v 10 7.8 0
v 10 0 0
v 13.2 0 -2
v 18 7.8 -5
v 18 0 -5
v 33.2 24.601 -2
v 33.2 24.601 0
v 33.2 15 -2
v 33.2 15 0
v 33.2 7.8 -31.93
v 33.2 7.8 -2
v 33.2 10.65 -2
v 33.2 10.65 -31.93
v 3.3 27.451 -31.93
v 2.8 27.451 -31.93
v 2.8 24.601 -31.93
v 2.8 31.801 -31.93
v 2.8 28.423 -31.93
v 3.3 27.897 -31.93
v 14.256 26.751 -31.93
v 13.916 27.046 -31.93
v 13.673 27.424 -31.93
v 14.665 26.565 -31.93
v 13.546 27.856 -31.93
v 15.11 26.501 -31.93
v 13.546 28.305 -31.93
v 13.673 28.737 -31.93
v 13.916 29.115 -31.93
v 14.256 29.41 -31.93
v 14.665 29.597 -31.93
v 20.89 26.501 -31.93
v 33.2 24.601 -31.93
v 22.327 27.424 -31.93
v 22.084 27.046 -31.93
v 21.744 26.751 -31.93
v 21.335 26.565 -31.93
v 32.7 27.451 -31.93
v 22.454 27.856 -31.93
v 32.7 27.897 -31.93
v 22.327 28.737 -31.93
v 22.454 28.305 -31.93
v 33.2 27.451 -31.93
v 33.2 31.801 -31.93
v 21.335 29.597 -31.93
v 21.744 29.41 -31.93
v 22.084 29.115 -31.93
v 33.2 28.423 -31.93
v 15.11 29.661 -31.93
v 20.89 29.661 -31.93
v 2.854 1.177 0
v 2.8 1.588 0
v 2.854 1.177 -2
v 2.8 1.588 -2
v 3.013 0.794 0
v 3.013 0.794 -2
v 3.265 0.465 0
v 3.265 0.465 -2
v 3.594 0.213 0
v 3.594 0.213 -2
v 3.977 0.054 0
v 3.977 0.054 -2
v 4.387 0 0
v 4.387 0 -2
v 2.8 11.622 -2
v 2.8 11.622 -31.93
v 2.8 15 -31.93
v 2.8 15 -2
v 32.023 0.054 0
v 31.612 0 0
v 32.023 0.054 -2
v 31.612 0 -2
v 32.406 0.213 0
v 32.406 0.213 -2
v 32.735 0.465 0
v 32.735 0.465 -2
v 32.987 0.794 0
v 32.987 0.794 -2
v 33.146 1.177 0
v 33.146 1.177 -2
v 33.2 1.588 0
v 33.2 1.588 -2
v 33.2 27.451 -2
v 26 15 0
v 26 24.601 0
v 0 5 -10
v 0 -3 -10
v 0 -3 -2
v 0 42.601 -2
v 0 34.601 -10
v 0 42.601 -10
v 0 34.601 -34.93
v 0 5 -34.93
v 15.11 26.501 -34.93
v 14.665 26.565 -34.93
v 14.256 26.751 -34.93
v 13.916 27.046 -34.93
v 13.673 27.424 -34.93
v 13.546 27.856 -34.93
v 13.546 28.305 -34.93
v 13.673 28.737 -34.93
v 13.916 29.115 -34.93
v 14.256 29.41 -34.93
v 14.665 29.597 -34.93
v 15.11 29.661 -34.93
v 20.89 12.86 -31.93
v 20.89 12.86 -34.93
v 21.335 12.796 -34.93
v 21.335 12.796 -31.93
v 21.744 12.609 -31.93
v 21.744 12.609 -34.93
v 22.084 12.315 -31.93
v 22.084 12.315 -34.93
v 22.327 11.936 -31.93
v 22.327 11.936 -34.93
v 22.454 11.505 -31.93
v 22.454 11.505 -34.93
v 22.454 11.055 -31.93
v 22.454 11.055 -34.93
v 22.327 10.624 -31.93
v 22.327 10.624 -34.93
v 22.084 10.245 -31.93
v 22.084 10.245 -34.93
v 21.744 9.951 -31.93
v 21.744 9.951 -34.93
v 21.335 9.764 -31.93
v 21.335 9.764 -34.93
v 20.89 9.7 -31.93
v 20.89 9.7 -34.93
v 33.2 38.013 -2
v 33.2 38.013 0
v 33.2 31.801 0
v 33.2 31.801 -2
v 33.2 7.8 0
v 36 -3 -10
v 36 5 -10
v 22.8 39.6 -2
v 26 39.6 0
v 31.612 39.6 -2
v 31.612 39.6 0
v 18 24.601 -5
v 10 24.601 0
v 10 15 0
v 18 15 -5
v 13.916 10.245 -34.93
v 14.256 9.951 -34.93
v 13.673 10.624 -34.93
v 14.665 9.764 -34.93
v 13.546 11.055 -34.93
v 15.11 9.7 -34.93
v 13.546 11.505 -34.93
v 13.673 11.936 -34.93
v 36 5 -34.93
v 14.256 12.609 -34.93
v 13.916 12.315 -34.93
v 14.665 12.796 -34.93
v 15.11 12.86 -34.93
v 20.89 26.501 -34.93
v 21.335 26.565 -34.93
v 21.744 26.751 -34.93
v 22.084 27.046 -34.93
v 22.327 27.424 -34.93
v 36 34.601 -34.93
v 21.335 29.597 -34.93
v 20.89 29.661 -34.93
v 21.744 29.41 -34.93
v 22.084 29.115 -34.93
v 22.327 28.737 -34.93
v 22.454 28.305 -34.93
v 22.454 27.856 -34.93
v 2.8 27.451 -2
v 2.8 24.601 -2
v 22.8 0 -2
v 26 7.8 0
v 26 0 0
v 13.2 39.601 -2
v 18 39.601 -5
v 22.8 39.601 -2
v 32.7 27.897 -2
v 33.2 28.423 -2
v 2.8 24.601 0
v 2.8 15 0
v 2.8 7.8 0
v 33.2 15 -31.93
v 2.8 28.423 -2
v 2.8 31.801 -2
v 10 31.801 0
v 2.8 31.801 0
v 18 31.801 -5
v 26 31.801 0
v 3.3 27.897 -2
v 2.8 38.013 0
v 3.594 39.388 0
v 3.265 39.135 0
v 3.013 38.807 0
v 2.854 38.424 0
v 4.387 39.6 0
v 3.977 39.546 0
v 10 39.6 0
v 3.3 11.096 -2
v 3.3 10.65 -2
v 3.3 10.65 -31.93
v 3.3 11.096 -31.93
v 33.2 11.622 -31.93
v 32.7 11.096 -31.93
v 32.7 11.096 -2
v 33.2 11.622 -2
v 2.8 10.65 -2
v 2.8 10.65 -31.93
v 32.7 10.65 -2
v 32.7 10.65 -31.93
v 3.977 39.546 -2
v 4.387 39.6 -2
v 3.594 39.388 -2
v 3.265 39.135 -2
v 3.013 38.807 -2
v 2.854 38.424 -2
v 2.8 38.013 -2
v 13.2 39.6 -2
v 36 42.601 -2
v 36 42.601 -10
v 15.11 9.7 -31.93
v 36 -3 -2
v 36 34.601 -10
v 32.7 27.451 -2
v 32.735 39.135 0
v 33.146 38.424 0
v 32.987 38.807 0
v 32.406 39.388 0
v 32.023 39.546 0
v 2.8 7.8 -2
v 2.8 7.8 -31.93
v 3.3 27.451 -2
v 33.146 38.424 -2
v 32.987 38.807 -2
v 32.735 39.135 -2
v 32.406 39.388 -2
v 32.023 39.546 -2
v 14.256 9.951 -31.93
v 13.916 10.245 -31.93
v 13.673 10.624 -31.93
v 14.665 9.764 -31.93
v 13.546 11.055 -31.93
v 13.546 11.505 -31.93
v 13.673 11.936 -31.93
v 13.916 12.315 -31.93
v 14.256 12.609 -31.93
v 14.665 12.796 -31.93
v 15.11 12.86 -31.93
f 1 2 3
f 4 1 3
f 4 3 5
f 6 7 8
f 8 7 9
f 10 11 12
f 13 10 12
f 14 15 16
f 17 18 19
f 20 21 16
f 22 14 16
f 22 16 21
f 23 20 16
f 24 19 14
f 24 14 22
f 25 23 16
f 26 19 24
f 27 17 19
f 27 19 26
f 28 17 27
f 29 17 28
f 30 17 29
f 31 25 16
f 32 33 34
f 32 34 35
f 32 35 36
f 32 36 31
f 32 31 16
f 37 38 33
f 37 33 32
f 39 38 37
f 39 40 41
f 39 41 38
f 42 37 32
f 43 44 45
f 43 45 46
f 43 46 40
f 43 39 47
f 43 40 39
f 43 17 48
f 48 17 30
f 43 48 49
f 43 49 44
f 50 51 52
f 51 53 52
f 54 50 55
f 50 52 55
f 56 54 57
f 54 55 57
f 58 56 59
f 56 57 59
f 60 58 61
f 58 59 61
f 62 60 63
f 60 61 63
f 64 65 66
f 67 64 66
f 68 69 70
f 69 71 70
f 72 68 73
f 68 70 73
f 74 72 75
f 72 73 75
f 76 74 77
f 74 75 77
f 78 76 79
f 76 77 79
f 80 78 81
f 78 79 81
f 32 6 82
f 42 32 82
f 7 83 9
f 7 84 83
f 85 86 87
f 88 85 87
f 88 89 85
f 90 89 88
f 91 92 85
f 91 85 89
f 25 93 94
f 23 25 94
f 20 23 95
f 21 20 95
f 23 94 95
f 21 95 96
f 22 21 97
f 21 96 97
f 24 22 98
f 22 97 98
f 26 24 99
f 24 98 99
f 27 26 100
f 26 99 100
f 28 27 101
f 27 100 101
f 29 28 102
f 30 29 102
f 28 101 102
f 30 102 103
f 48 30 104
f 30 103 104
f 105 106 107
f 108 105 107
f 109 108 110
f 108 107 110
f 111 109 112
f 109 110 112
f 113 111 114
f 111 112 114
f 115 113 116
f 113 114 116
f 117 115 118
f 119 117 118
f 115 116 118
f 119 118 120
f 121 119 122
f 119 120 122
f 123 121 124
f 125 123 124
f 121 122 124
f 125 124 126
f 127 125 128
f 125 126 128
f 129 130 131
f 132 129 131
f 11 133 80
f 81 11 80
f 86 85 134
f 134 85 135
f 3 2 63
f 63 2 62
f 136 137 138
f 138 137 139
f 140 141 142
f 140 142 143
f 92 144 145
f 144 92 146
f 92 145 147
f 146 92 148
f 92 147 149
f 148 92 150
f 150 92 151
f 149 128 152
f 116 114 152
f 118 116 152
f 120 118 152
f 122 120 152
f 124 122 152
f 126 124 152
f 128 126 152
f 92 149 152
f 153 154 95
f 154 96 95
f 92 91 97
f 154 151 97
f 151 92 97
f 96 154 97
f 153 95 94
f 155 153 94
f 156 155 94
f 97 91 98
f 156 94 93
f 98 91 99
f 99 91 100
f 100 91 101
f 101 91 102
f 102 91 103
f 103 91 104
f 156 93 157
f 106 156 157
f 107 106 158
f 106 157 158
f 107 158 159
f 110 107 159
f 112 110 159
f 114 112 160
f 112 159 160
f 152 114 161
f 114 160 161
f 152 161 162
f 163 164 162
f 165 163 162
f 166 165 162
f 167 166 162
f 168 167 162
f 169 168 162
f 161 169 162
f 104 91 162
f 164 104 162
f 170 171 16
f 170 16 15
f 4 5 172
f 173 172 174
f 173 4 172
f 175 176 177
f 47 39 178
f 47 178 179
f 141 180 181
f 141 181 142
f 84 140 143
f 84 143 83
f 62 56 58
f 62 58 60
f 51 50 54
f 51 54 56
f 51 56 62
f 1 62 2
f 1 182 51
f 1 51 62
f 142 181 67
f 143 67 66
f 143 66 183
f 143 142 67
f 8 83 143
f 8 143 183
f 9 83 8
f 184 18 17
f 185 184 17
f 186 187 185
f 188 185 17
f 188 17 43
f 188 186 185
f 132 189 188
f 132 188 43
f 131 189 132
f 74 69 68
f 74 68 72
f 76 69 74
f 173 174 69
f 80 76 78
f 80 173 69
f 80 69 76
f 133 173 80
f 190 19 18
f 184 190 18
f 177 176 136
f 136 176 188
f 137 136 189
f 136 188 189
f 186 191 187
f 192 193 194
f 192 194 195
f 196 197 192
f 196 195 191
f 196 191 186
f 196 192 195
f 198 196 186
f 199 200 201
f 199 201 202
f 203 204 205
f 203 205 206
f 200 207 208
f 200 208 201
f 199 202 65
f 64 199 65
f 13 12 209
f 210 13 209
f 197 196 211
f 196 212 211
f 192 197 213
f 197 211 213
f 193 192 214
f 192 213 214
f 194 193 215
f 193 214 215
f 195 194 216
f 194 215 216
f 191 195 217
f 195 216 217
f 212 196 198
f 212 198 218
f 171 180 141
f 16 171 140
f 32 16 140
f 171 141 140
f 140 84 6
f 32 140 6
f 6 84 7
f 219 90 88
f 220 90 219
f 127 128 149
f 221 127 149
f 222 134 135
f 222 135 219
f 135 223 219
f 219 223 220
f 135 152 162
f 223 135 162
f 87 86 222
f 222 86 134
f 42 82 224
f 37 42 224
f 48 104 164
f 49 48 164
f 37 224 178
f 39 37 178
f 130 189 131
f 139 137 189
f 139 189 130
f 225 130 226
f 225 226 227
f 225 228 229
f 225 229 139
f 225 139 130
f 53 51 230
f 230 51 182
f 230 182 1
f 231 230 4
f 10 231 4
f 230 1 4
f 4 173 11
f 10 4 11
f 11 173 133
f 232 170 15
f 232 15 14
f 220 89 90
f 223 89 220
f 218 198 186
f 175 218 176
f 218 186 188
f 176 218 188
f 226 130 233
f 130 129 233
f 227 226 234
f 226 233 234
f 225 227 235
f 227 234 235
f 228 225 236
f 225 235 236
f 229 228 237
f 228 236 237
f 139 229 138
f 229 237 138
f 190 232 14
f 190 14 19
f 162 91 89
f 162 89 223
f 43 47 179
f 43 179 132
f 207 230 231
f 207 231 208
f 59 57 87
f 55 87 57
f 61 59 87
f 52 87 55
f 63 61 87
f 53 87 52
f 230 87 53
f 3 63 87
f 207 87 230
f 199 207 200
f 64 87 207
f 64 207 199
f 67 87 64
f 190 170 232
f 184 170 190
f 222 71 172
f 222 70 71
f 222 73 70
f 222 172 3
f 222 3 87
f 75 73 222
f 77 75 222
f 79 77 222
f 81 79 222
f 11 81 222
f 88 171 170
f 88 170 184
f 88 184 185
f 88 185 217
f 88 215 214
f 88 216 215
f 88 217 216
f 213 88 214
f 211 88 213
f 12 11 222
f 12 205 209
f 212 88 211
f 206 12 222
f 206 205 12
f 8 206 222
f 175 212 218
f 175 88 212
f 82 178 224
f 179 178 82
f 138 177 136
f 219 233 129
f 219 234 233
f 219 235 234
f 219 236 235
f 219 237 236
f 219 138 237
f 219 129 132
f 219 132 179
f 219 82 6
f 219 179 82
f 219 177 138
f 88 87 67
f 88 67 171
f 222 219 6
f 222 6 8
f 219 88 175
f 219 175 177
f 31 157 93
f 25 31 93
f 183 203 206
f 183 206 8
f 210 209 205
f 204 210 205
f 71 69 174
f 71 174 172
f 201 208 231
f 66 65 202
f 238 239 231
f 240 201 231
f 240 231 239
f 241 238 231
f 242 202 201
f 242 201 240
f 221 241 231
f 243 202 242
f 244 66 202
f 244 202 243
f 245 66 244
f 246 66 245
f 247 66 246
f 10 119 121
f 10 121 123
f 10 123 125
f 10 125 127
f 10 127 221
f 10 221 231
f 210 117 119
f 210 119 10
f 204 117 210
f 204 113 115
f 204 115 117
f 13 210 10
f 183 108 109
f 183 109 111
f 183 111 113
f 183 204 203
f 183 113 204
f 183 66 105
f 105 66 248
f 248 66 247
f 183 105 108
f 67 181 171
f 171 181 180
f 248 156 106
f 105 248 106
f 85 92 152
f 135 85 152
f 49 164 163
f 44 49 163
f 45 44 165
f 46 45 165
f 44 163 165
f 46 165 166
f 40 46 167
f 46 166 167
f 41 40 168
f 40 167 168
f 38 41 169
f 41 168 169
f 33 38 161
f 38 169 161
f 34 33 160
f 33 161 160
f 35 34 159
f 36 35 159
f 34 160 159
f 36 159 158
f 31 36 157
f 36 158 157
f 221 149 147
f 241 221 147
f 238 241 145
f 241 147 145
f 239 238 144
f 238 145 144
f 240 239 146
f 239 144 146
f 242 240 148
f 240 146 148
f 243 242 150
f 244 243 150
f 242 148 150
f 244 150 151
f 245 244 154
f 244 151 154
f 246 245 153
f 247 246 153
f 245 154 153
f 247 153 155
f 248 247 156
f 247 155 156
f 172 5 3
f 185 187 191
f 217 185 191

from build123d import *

# Parameters (mm, degrees)
SKETCH1_W            = 35.999968648
SKETCH1_H            = 39.60056603
BOSS_EXTRUDE1_DEPTH  = 33.93
SKETCH2_W            = 28.93
SKETCH2_H            = 5
CUT_EXTRUDE1_DEPTH   = 64.367558518
SKETCH3_W            = 16
SKETCH3_H            = 5
CUT_EXTRUDE2_DEPTH   = 64.367558518
CUT_EXTRUDE3_DEPTH   = 61.369212453
SKETCH5_W            = 30.4
SKETCH5_H            = 7.2
CUT_EXTRUDE4_DEPTH   = 31.93
CUT_EXTRUDE5_DEPTH   = 63.319559309
BOSS_EXTRUDE2_REACH  = 65.368
BOSS_EXTRUDE3_DEPTH  = 5
SKETCH16_W           = 35.999968648
SKETCH16_H           = 10
BOSS_EXTRUDE8_DEPTH  = 3
SKETCH12_W           = 35.999968648
SKETCH12_H           = 45.60056603
CUT_EXTRUDE6_DEPTH   = 2
FILLET1_R            = 1.5875
MOVE_START           = -34.93
MOVE_FACE1_OUTLINE_W = 35.999968648
MOVE_FACE1_OUTLINE_H = 29.60056603
MOVE_FACE1_DEPTH     = 1


# Read off the part's stored shape, not the designer's step: Move Face1
with BuildPart() as part:
    # Sketch1 → Boss-Extrude1 (new body)
    with BuildSketch(Plane.XY):
        with Locations((17.999984324, 19.800283015)):
            Rectangle(SKETCH1_W, SKETCH1_H)
    extrude(amount=-BOSS_EXTRUDE1_DEPTH)

    # Sketch2 → Cut-Extrude1 (cut, through all)
    with BuildSketch(Plane(origin=(35.999968648, 0, 0), x_dir=(0, 0, -1), z_dir=(1, 0, 0))):
        with Locations((19.465, 37.10056603)):
            Rectangle(SKETCH2_W, SKETCH2_H)
        with Locations((19.465, 2.5)):
            Rectangle(SKETCH2_W, SKETCH2_H)
    extrude(amount=-CUT_EXTRUDE1_DEPTH, mode=Mode.SUBTRACT)

    # Sketch3 → Cut-Extrude2 (cut, through all)
    with BuildSketch(Plane.XY):
        with Locations((17.999984324, 37.10056603)):
            Rectangle(SKETCH3_W, SKETCH3_H)
        with Locations((17.999984324, 2.5)):
            Rectangle(SKETCH3_W, SKETCH3_H)
    extrude(amount=-CUT_EXTRUDE2_DEPTH, mode=Mode.SUBTRACT)

    # Sketch4 → Cut-Extrude3 (cut, through all)
    with BuildSketch(Plane(origin=(0, 34.60056603, 0), x_dir=(1, 0, 0), z_dir=(0, 1, 0))):
        Polygon((9.999984324, 0), (17.999984324, 5), (25.999984324, 0), align=None)
    extrude(amount=-CUT_EXTRUDE3_DEPTH, mode=Mode.SUBTRACT)

    # Sketch5 → Cut-Extrude4 (cut)
    with BuildSketch(Plane.XY):
        with Locations((17.999984324, 11.4)):
            Rectangle(SKETCH5_W, SKETCH5_H)
        with Locations((17.999984324, 28.20056603)):
            Rectangle(SKETCH5_W, SKETCH5_H)
    extrude(amount=-CUT_EXTRUDE4_DEPTH, mode=Mode.SUBTRACT)

    # Sketch6 → Cut-Extrude5 (cut, through all)
    with BuildSketch(Plane.XY.offset(-31.93)):
        with BuildLine():
            Line((15.109984324, 29.66056603), (20.889984324, 29.66056603))
            ThreePointArc((20.889984324, 29.66056603), (22.469984324, 28.08056603), (20.889984324, 26.50056603))
            Line((20.889984324, 26.50056603), (15.109984324, 26.50056603))
            ThreePointArc((15.109984324, 26.50056603), (13.529984324, 28.08056603), (15.109984324, 29.66056603))
        make_face()
        with BuildLine():
            Line((15.109984324, 12.86), (20.889984324, 12.86))
            ThreePointArc((20.889984324, 12.86), (22.469984324, 11.28), (20.889984324, 9.7))
            Line((20.889984324, 9.7), (15.109984324, 9.7))
            ThreePointArc((15.109984324, 9.7), (13.529984324, 11.28), (15.109984324, 12.86))
        make_face()
    extrude(amount=-CUT_EXTRUDE5_DEPTH, mode=Mode.SUBTRACT)

    # Sketch7 → Boss-Extrude2 (add, up to next)
    with BuildSketch(Plane.XY, mode=Mode.PRIVATE) as boss_extrude2_sk1:
        Polygon((2.799984324, 28.422935376), (2.799984324, 27.45056603), (3.299984324, 27.45056603), (3.299984324, 27.896781183), align=None)
    boss_extrude2_tool1 = extrude(boss_extrude2_sk1.sketch, amount=-BOSS_EXTRUDE2_REACH, mode=Mode.PRIVATE) - part.part
    # Sketch7 → Boss-Extrude2 (add, up to next)
    with BuildSketch(Plane.XY, mode=Mode.PRIVATE) as boss_extrude2_sk2:
        Polygon((2.799984324, 11.622369346), (2.799984324, 10.65), (3.299984324, 10.65), (3.299984324, 11.096215154), align=None)
    boss_extrude2_tool2 = extrude(boss_extrude2_sk2.sketch, amount=-BOSS_EXTRUDE2_REACH, mode=Mode.PRIVATE) - part.part
    boss_extrude2_1 = boss_extrude2_tool1.solids().sort_by_distance((3.019076, 27.821475, 0))[0]
    add(boss_extrude2_1)
    boss_extrude2_2 = boss_extrude2_tool2.solids().sort_by_distance((3.019076, 11.020909, 0))[0]
    add(boss_extrude2_2)
    boss_extrude2 = boss_extrude2_1 + boss_extrude2_2  # Boss-Extrude2 as one shape, for the pattern or mirror that repeats it

    # Mirror1: Boss-Extrude2 across plane
    add(boss_extrude2.mirror(Plane(origin=(17.999984324, 0, 0), x_dir=(0, 0, 1), z_dir=(1, 0, 0))))

    # Sketch8 → Boss-Extrude3 (add)
    with BuildSketch(Plane(origin=(0, 34.60056603, 0), x_dir=(1, 0, 0), z_dir=(0, 1, 0))):
        Polygon((9.999984324, 0), (17.999984324, 5), (25.999984324, 0), (35.999968648, 0), (35.999968648, 10), (0, 10), (0, 0), align=None)
    boss_extrude3 = extrude(amount=BOSS_EXTRUDE3_DEPTH)

    # Sketch16 → Boss-Extrude8 (add)
    with BuildSketch(Plane(origin=(0, 39.60056603, 0), x_dir=(1, 0, 0), z_dir=(0, 1, 0))):
        with Locations((17.999984324, 5)):
            Rectangle(SKETCH16_W, SKETCH16_H)
    boss_extrude8 = extrude(amount=BOSS_EXTRUDE8_DEPTH)

    # Mirror2: Boss-Extrude3, Boss-Extrude8 across plane
    add(boss_extrude3.mirror(Plane.ZX.offset(19.800283015)))
    add(boss_extrude8.mirror(Plane.ZX.offset(19.800283015)))

    # Sketch12 → Cut-Extrude6 (cut)
    with BuildSketch(Plane.XY):
        with Locations((17.999984324, 19.800283015)):
            Rectangle(SKETCH12_W, SKETCH12_H)
        Polygon((2.799984324, 39.600283015), (33.199984324, 39.600283015), (33.199984324, 28.422935376), (32.699984324, 27.896781183), (32.699984324, 27.45056603), (33.199984324, 27.45056603), (33.199984324, 11.622369346), (32.699984324, 11.096215154), (32.699984324, 10.65), (33.199984324, 10.65), (33.199984324, 0.000283015), (2.799984324, 0.000283015), (2.799984324, 10.65), (3.299984324, 10.65), (3.299984324, 11.096215154), (2.799984324, 11.622369346), (2.799984324, 27.45056603), (3.299984324, 27.45056603), (3.299984324, 27.896781183), (2.799984324, 28.422935376), align=None, mode=Mode.SUBTRACT)
    extrude(amount=-CUT_EXTRUDE6_DEPTH, mode=Mode.SUBTRACT)

    # Fillet1
    fillet1_edges = [part.edges().sort_by_distance(p)[0] for p in [
        (33.199984324, 39.600283015, -1),
        (2.799984324, 0.000283015, -1),
        (2.799984324, 39.600283015, -1),
        (33.199984324, 0.000283015, -1),
    ]]
    fillet(fillet1_edges, radius=FILLET1_R)

    # Move Face1 outline → Move Face1 (add)
    with BuildSketch(Plane.XY.offset(MOVE_START)):
        with Locations((17.999984324, 19.800283015)):
            Rectangle(MOVE_FACE1_OUTLINE_W, MOVE_FACE1_OUTLINE_H)
        with BuildLine():
            ThreePointArc((15.109984324, 9.7), (13.529984324, 11.28), (15.109984324, 12.86))
            Line((15.109984324, 12.86), (20.889984324, 12.86))
            ThreePointArc((20.889984324, 12.86), (22.469984324, 11.28), (20.889984324, 9.7))
            Line((20.889984324, 9.7), (15.109984324, 9.7))
        make_face(mode=Mode.SUBTRACT)
        with BuildLine():
            ThreePointArc((15.109984324, 26.50056603), (13.529984324, 28.08056603), (15.109984324, 29.66056603))
            Line((15.109984324, 29.66056603), (20.889984324, 29.66056603))
            ThreePointArc((20.889984324, 29.66056603), (22.469984324, 28.08056603), (20.889984324, 26.50056603))
            Line((20.889984324, 26.50056603), (15.109984324, 26.50056603))
        make_face(mode=Mode.SUBTRACT)
    extrude(amount=MOVE_FACE1_DEPTH)


solid = part.part
